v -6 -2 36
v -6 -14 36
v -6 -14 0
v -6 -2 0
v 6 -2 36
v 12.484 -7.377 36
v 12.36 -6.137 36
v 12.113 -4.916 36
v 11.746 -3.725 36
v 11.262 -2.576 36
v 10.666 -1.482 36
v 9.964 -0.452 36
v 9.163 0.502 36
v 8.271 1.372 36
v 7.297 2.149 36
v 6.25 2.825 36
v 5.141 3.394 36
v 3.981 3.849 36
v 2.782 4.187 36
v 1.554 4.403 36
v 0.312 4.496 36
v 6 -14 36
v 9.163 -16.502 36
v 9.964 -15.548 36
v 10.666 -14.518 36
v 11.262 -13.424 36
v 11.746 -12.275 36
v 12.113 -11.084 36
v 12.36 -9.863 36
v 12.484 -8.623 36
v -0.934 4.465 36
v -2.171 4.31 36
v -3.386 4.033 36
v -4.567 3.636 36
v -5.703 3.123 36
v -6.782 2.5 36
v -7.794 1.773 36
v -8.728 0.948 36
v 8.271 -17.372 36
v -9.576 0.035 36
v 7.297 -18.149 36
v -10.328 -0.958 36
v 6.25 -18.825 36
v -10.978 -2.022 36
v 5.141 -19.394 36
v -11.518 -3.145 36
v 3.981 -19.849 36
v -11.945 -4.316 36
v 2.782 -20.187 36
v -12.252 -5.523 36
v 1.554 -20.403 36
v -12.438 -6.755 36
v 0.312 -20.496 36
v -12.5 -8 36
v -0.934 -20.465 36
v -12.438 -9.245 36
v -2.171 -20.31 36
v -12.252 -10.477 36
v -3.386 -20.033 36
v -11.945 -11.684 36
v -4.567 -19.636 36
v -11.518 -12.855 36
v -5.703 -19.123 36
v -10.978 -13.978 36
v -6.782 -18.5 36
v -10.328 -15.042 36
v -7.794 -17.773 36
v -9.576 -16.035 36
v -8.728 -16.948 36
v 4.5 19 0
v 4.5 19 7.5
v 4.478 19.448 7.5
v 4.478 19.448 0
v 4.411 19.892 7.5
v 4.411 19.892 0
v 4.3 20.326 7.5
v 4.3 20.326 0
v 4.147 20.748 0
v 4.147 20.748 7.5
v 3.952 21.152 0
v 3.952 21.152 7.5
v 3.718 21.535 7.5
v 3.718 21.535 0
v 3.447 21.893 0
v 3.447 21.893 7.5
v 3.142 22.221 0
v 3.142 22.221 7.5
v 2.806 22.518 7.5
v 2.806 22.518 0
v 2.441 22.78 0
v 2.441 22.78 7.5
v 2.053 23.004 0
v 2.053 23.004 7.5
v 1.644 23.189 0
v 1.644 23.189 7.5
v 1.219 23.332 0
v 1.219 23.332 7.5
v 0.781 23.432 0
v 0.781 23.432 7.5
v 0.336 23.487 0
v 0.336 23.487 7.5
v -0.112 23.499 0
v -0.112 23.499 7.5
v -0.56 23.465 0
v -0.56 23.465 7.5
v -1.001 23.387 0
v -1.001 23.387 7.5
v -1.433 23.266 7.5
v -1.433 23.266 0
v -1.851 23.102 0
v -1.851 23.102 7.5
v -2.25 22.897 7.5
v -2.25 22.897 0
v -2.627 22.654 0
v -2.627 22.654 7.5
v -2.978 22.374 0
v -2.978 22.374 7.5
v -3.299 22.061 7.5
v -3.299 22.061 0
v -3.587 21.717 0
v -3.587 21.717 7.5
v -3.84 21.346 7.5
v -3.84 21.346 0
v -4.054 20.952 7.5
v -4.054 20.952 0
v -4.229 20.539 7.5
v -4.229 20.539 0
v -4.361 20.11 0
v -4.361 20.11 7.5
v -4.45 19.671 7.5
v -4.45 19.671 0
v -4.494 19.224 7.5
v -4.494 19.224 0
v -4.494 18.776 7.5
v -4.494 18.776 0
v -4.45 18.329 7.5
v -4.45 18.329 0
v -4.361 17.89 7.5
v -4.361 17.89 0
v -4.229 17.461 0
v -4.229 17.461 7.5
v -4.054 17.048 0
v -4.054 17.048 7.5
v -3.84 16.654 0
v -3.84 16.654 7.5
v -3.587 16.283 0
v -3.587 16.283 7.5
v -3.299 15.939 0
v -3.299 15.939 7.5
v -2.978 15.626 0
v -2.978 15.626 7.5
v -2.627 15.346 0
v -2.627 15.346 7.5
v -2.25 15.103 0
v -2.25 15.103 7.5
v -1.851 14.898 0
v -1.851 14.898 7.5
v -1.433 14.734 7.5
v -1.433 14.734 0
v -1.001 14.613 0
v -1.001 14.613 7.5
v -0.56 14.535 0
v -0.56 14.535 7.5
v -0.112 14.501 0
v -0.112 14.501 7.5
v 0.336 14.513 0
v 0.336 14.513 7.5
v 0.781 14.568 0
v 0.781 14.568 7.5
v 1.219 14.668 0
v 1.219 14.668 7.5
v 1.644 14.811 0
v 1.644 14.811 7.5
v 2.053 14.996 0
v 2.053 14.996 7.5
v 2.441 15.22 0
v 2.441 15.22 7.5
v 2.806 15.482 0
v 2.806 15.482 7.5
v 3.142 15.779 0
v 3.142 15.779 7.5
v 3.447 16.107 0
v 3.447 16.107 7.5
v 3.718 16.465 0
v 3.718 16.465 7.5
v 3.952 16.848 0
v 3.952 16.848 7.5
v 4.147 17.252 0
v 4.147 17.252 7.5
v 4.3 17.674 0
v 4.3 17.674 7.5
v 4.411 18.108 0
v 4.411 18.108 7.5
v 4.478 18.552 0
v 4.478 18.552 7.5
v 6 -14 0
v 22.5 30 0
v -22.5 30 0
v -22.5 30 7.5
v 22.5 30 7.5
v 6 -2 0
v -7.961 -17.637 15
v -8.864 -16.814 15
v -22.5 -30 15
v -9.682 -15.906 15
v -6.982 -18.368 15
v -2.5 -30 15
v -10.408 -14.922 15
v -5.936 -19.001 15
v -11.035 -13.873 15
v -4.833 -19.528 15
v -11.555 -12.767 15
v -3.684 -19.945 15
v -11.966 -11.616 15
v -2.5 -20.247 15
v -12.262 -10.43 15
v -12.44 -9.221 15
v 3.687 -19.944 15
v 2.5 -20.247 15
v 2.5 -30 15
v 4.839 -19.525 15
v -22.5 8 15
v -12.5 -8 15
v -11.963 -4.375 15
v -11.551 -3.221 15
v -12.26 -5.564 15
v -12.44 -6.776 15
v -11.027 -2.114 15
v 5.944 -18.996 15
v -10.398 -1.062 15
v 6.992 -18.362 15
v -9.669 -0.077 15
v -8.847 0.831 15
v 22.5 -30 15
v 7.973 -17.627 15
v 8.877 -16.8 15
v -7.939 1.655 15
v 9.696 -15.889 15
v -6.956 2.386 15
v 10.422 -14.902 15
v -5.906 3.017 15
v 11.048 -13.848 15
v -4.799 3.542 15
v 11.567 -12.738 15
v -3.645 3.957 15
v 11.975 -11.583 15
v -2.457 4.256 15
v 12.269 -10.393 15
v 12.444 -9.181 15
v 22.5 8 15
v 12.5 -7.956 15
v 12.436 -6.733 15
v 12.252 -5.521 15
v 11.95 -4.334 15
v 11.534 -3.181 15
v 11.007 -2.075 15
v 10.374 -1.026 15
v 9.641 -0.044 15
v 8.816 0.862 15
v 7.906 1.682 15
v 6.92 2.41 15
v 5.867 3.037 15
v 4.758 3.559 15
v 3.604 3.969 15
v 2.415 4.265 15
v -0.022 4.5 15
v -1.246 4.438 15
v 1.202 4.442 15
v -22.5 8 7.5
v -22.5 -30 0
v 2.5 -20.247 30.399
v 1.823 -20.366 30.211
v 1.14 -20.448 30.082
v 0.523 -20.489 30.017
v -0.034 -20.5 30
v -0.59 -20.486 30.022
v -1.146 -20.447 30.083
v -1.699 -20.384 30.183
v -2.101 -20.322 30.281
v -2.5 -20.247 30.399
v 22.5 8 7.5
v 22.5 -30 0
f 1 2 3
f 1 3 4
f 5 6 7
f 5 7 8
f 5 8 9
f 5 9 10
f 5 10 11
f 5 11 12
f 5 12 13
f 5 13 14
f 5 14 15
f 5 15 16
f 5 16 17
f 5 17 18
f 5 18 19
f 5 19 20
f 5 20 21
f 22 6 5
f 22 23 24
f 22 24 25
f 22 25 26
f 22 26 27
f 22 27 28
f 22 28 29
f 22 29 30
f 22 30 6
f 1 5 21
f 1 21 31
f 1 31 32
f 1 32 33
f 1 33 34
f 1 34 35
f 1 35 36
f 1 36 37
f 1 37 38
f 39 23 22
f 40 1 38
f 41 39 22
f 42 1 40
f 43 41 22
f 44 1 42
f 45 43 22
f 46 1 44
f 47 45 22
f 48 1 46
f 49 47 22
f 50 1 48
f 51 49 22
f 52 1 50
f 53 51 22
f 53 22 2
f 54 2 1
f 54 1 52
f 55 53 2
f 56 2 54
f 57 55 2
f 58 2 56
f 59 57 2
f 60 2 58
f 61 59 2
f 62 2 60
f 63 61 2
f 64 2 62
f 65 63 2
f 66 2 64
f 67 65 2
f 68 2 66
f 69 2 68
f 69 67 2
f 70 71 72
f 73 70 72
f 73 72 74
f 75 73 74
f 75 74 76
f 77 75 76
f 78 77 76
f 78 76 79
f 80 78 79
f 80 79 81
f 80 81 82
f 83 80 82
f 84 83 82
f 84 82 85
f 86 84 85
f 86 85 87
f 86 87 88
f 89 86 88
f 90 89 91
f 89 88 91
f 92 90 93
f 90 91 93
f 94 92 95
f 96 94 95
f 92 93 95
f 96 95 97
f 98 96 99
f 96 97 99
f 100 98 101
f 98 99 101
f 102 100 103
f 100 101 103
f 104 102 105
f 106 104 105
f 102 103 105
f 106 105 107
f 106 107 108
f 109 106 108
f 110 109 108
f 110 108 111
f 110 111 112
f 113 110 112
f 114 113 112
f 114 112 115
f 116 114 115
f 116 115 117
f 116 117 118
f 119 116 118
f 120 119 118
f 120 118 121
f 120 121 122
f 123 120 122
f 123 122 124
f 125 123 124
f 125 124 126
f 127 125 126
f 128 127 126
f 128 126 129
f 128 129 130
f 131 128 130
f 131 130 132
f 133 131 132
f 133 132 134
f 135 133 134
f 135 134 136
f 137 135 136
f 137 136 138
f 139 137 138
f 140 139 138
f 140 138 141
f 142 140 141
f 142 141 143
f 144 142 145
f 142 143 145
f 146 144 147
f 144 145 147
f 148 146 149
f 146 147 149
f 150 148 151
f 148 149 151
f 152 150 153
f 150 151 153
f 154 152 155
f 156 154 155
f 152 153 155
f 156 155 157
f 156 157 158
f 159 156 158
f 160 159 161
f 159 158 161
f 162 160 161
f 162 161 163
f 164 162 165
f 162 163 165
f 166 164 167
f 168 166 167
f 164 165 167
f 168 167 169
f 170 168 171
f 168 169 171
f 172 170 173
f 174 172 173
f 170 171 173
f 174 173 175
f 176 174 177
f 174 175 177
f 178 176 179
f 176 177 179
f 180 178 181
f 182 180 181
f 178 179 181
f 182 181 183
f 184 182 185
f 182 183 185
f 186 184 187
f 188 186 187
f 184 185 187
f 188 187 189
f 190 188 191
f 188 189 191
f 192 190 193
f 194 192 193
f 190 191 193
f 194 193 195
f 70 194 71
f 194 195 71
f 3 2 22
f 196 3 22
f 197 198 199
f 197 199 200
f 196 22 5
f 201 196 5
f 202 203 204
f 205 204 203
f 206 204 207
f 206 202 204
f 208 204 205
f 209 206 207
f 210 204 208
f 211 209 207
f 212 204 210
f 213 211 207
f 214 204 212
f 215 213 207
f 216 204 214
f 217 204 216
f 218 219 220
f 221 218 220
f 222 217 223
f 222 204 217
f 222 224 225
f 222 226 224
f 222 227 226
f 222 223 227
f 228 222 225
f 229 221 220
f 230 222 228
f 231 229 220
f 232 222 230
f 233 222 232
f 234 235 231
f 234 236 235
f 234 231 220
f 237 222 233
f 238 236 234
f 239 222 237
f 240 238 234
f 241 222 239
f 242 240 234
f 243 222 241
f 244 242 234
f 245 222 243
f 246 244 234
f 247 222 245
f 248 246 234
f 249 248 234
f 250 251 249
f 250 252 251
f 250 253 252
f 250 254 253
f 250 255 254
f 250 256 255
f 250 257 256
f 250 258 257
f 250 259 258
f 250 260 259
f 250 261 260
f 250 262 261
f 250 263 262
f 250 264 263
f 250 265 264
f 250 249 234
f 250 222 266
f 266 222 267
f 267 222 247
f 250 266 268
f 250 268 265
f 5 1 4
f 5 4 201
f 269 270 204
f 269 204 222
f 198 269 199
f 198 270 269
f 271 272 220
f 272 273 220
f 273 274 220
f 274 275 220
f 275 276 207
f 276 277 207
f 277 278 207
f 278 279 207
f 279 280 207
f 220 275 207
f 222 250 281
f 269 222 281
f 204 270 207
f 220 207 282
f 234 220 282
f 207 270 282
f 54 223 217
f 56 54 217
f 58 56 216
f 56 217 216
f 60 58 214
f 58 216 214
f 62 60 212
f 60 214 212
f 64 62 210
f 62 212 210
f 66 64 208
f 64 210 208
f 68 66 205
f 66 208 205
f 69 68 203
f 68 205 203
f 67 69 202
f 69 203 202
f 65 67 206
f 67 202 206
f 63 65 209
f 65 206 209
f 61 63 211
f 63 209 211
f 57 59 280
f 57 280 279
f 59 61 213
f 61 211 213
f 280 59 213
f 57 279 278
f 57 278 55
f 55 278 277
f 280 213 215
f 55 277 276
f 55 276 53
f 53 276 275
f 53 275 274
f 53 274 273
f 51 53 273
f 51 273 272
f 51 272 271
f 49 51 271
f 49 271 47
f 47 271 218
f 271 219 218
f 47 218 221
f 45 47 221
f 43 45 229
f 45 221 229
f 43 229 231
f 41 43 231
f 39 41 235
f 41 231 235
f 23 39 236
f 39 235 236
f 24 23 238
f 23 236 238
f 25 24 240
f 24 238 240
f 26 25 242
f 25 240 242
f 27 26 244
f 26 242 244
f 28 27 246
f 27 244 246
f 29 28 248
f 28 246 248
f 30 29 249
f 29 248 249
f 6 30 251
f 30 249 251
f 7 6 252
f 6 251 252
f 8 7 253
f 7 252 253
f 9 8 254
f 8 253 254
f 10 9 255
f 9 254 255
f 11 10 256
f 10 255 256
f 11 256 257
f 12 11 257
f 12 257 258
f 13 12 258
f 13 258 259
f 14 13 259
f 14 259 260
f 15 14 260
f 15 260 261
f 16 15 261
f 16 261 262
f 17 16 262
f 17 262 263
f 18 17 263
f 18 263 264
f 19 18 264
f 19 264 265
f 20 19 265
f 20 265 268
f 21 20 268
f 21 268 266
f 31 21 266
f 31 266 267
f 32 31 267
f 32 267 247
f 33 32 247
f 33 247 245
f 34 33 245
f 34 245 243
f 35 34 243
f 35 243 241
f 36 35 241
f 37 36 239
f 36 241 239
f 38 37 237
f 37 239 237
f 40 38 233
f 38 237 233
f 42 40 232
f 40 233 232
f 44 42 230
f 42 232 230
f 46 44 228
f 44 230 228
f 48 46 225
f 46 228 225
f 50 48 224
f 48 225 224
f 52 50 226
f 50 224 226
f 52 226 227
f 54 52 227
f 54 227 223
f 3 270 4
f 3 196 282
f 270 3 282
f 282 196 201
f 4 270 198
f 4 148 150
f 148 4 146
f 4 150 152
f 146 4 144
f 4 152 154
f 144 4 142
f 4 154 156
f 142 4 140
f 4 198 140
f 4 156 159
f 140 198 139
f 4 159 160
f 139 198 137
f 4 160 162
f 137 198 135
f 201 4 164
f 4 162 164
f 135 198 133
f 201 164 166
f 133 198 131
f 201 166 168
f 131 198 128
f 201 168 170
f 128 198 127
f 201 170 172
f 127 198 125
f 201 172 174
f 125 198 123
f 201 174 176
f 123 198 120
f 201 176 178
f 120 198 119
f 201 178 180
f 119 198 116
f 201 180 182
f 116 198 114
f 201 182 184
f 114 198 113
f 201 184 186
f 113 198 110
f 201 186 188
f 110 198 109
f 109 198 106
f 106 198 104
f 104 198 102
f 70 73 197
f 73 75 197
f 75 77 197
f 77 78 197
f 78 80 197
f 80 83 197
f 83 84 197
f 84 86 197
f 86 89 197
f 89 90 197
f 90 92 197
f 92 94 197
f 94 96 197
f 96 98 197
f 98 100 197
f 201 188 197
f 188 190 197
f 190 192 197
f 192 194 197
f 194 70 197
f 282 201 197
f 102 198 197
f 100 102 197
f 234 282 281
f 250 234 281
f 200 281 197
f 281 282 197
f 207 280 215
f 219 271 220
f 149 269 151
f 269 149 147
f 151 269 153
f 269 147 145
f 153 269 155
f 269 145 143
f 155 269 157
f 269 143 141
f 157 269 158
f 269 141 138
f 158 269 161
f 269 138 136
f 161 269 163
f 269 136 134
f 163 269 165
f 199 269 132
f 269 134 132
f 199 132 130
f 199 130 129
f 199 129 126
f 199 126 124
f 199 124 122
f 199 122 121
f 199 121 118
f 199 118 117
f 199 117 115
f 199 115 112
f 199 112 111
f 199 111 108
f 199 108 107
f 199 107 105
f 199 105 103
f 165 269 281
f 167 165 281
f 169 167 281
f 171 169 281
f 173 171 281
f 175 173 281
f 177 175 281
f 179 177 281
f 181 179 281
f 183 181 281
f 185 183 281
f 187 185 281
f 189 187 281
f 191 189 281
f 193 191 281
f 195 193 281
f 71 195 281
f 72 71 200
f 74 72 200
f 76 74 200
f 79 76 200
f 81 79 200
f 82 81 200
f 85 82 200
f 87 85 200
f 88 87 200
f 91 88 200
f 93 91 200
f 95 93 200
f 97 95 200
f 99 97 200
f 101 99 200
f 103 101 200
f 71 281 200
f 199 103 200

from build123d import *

# Parameters (mm, degrees)
SKETCH_1_W          = 45
SKETCH_1_H          = 60
EXTRUDE_1_DEPTH     = 15
SKETCH_2_W          = 7.5
SKETCH_2_H          = 22
CUT_EXTRUDE_1_DEPTH = 57.124860802
SKETCH_3_R          = 12.5
EXTRUDE_2_DEPTH     = 21
SKETCH_6_R          = 4.5
CUT_EXTRUDE_4_DEPTH = 48.100955404
RIB_1_REACH         = 53.983
SKETCH_7_WALL_W     = 123.721621612
SKETCH_7_WALL_H     = 5
SKETCH_8_W          = 12
SKETCH_8_H          = 12
CUT_EXTRUDE_5_DEPTH = 52.983170353


with BuildPart() as part:
    # Эскиз1 → Бобышка-Вытянуть1 (new body)
    with BuildSketch(Plane.XY):
        Rectangle(SKETCH_1_W, SKETCH_1_H)
    extrude(amount=EXTRUDE_1_DEPTH)

    # Эскиз2 → Вырез-Вытянуть1 (cut, through all)
    with BuildSketch(Plane(origin=(22.5, 0, 0), x_dir=(0, 0, -1), z_dir=(1, 0, 0))):
        with Locations((-11.25, 19)):
            Rectangle(SKETCH_2_W, SKETCH_2_H)
    extrude(amount=-CUT_EXTRUDE_1_DEPTH, mode=Mode.SUBTRACT)

    # Эскиз3 → Бобышка-Вытянуть2 (add)
    with BuildSketch(Plane.XY.offset(15)):
        with Locations(Location((0, -8, 0), (0, 0, 180))):
            Circle(SKETCH_3_R)
    extrude(amount=EXTRUDE_2_DEPTH)

    # Эскиз6 → Вырез-Вытянуть4 (cut, through all)
    with BuildSketch(Plane.XY.offset(7.5)):
        with Locations((0, 19)):
            Circle(SKETCH_6_R)
    extrude(amount=-CUT_EXTRUDE_4_DEPTH, mode=Mode.SUBTRACT)

    # Эскиз7 wall → Ребро1 (add, up to next)
    with BuildSketch(Plane(origin=(0, -25.25, 22.5), x_dir=(0, -0.535052081184, -0.844819075554), z_dir=(0, 0.844819075554, -0.535052081184)), mode=Mode.PRIVATE) as rib_1_sk1:
        Rectangle(SKETCH_7_WALL_W, SKETCH_7_WALL_H)
    rib_1_tool1 = extrude(rib_1_sk1.sketch, amount=RIB_1_REACH, mode=Mode.PRIVATE) - part.part
    add(rib_1_tool1.solids().sort_by_distance((0, -25.25, 22.5))[0])

    # Эскиз8 → Вырез-Вытянуть5 (cut, through all)
    with BuildSketch(Plane.XY.offset(36)):
        with Locations((0, -8)):
            Rectangle(SKETCH_8_W, SKETCH_8_H)
    extrude(amount=-CUT_EXTRUDE_5_DEPTH, mode=Mode.SUBTRACT)


solid = part.part
